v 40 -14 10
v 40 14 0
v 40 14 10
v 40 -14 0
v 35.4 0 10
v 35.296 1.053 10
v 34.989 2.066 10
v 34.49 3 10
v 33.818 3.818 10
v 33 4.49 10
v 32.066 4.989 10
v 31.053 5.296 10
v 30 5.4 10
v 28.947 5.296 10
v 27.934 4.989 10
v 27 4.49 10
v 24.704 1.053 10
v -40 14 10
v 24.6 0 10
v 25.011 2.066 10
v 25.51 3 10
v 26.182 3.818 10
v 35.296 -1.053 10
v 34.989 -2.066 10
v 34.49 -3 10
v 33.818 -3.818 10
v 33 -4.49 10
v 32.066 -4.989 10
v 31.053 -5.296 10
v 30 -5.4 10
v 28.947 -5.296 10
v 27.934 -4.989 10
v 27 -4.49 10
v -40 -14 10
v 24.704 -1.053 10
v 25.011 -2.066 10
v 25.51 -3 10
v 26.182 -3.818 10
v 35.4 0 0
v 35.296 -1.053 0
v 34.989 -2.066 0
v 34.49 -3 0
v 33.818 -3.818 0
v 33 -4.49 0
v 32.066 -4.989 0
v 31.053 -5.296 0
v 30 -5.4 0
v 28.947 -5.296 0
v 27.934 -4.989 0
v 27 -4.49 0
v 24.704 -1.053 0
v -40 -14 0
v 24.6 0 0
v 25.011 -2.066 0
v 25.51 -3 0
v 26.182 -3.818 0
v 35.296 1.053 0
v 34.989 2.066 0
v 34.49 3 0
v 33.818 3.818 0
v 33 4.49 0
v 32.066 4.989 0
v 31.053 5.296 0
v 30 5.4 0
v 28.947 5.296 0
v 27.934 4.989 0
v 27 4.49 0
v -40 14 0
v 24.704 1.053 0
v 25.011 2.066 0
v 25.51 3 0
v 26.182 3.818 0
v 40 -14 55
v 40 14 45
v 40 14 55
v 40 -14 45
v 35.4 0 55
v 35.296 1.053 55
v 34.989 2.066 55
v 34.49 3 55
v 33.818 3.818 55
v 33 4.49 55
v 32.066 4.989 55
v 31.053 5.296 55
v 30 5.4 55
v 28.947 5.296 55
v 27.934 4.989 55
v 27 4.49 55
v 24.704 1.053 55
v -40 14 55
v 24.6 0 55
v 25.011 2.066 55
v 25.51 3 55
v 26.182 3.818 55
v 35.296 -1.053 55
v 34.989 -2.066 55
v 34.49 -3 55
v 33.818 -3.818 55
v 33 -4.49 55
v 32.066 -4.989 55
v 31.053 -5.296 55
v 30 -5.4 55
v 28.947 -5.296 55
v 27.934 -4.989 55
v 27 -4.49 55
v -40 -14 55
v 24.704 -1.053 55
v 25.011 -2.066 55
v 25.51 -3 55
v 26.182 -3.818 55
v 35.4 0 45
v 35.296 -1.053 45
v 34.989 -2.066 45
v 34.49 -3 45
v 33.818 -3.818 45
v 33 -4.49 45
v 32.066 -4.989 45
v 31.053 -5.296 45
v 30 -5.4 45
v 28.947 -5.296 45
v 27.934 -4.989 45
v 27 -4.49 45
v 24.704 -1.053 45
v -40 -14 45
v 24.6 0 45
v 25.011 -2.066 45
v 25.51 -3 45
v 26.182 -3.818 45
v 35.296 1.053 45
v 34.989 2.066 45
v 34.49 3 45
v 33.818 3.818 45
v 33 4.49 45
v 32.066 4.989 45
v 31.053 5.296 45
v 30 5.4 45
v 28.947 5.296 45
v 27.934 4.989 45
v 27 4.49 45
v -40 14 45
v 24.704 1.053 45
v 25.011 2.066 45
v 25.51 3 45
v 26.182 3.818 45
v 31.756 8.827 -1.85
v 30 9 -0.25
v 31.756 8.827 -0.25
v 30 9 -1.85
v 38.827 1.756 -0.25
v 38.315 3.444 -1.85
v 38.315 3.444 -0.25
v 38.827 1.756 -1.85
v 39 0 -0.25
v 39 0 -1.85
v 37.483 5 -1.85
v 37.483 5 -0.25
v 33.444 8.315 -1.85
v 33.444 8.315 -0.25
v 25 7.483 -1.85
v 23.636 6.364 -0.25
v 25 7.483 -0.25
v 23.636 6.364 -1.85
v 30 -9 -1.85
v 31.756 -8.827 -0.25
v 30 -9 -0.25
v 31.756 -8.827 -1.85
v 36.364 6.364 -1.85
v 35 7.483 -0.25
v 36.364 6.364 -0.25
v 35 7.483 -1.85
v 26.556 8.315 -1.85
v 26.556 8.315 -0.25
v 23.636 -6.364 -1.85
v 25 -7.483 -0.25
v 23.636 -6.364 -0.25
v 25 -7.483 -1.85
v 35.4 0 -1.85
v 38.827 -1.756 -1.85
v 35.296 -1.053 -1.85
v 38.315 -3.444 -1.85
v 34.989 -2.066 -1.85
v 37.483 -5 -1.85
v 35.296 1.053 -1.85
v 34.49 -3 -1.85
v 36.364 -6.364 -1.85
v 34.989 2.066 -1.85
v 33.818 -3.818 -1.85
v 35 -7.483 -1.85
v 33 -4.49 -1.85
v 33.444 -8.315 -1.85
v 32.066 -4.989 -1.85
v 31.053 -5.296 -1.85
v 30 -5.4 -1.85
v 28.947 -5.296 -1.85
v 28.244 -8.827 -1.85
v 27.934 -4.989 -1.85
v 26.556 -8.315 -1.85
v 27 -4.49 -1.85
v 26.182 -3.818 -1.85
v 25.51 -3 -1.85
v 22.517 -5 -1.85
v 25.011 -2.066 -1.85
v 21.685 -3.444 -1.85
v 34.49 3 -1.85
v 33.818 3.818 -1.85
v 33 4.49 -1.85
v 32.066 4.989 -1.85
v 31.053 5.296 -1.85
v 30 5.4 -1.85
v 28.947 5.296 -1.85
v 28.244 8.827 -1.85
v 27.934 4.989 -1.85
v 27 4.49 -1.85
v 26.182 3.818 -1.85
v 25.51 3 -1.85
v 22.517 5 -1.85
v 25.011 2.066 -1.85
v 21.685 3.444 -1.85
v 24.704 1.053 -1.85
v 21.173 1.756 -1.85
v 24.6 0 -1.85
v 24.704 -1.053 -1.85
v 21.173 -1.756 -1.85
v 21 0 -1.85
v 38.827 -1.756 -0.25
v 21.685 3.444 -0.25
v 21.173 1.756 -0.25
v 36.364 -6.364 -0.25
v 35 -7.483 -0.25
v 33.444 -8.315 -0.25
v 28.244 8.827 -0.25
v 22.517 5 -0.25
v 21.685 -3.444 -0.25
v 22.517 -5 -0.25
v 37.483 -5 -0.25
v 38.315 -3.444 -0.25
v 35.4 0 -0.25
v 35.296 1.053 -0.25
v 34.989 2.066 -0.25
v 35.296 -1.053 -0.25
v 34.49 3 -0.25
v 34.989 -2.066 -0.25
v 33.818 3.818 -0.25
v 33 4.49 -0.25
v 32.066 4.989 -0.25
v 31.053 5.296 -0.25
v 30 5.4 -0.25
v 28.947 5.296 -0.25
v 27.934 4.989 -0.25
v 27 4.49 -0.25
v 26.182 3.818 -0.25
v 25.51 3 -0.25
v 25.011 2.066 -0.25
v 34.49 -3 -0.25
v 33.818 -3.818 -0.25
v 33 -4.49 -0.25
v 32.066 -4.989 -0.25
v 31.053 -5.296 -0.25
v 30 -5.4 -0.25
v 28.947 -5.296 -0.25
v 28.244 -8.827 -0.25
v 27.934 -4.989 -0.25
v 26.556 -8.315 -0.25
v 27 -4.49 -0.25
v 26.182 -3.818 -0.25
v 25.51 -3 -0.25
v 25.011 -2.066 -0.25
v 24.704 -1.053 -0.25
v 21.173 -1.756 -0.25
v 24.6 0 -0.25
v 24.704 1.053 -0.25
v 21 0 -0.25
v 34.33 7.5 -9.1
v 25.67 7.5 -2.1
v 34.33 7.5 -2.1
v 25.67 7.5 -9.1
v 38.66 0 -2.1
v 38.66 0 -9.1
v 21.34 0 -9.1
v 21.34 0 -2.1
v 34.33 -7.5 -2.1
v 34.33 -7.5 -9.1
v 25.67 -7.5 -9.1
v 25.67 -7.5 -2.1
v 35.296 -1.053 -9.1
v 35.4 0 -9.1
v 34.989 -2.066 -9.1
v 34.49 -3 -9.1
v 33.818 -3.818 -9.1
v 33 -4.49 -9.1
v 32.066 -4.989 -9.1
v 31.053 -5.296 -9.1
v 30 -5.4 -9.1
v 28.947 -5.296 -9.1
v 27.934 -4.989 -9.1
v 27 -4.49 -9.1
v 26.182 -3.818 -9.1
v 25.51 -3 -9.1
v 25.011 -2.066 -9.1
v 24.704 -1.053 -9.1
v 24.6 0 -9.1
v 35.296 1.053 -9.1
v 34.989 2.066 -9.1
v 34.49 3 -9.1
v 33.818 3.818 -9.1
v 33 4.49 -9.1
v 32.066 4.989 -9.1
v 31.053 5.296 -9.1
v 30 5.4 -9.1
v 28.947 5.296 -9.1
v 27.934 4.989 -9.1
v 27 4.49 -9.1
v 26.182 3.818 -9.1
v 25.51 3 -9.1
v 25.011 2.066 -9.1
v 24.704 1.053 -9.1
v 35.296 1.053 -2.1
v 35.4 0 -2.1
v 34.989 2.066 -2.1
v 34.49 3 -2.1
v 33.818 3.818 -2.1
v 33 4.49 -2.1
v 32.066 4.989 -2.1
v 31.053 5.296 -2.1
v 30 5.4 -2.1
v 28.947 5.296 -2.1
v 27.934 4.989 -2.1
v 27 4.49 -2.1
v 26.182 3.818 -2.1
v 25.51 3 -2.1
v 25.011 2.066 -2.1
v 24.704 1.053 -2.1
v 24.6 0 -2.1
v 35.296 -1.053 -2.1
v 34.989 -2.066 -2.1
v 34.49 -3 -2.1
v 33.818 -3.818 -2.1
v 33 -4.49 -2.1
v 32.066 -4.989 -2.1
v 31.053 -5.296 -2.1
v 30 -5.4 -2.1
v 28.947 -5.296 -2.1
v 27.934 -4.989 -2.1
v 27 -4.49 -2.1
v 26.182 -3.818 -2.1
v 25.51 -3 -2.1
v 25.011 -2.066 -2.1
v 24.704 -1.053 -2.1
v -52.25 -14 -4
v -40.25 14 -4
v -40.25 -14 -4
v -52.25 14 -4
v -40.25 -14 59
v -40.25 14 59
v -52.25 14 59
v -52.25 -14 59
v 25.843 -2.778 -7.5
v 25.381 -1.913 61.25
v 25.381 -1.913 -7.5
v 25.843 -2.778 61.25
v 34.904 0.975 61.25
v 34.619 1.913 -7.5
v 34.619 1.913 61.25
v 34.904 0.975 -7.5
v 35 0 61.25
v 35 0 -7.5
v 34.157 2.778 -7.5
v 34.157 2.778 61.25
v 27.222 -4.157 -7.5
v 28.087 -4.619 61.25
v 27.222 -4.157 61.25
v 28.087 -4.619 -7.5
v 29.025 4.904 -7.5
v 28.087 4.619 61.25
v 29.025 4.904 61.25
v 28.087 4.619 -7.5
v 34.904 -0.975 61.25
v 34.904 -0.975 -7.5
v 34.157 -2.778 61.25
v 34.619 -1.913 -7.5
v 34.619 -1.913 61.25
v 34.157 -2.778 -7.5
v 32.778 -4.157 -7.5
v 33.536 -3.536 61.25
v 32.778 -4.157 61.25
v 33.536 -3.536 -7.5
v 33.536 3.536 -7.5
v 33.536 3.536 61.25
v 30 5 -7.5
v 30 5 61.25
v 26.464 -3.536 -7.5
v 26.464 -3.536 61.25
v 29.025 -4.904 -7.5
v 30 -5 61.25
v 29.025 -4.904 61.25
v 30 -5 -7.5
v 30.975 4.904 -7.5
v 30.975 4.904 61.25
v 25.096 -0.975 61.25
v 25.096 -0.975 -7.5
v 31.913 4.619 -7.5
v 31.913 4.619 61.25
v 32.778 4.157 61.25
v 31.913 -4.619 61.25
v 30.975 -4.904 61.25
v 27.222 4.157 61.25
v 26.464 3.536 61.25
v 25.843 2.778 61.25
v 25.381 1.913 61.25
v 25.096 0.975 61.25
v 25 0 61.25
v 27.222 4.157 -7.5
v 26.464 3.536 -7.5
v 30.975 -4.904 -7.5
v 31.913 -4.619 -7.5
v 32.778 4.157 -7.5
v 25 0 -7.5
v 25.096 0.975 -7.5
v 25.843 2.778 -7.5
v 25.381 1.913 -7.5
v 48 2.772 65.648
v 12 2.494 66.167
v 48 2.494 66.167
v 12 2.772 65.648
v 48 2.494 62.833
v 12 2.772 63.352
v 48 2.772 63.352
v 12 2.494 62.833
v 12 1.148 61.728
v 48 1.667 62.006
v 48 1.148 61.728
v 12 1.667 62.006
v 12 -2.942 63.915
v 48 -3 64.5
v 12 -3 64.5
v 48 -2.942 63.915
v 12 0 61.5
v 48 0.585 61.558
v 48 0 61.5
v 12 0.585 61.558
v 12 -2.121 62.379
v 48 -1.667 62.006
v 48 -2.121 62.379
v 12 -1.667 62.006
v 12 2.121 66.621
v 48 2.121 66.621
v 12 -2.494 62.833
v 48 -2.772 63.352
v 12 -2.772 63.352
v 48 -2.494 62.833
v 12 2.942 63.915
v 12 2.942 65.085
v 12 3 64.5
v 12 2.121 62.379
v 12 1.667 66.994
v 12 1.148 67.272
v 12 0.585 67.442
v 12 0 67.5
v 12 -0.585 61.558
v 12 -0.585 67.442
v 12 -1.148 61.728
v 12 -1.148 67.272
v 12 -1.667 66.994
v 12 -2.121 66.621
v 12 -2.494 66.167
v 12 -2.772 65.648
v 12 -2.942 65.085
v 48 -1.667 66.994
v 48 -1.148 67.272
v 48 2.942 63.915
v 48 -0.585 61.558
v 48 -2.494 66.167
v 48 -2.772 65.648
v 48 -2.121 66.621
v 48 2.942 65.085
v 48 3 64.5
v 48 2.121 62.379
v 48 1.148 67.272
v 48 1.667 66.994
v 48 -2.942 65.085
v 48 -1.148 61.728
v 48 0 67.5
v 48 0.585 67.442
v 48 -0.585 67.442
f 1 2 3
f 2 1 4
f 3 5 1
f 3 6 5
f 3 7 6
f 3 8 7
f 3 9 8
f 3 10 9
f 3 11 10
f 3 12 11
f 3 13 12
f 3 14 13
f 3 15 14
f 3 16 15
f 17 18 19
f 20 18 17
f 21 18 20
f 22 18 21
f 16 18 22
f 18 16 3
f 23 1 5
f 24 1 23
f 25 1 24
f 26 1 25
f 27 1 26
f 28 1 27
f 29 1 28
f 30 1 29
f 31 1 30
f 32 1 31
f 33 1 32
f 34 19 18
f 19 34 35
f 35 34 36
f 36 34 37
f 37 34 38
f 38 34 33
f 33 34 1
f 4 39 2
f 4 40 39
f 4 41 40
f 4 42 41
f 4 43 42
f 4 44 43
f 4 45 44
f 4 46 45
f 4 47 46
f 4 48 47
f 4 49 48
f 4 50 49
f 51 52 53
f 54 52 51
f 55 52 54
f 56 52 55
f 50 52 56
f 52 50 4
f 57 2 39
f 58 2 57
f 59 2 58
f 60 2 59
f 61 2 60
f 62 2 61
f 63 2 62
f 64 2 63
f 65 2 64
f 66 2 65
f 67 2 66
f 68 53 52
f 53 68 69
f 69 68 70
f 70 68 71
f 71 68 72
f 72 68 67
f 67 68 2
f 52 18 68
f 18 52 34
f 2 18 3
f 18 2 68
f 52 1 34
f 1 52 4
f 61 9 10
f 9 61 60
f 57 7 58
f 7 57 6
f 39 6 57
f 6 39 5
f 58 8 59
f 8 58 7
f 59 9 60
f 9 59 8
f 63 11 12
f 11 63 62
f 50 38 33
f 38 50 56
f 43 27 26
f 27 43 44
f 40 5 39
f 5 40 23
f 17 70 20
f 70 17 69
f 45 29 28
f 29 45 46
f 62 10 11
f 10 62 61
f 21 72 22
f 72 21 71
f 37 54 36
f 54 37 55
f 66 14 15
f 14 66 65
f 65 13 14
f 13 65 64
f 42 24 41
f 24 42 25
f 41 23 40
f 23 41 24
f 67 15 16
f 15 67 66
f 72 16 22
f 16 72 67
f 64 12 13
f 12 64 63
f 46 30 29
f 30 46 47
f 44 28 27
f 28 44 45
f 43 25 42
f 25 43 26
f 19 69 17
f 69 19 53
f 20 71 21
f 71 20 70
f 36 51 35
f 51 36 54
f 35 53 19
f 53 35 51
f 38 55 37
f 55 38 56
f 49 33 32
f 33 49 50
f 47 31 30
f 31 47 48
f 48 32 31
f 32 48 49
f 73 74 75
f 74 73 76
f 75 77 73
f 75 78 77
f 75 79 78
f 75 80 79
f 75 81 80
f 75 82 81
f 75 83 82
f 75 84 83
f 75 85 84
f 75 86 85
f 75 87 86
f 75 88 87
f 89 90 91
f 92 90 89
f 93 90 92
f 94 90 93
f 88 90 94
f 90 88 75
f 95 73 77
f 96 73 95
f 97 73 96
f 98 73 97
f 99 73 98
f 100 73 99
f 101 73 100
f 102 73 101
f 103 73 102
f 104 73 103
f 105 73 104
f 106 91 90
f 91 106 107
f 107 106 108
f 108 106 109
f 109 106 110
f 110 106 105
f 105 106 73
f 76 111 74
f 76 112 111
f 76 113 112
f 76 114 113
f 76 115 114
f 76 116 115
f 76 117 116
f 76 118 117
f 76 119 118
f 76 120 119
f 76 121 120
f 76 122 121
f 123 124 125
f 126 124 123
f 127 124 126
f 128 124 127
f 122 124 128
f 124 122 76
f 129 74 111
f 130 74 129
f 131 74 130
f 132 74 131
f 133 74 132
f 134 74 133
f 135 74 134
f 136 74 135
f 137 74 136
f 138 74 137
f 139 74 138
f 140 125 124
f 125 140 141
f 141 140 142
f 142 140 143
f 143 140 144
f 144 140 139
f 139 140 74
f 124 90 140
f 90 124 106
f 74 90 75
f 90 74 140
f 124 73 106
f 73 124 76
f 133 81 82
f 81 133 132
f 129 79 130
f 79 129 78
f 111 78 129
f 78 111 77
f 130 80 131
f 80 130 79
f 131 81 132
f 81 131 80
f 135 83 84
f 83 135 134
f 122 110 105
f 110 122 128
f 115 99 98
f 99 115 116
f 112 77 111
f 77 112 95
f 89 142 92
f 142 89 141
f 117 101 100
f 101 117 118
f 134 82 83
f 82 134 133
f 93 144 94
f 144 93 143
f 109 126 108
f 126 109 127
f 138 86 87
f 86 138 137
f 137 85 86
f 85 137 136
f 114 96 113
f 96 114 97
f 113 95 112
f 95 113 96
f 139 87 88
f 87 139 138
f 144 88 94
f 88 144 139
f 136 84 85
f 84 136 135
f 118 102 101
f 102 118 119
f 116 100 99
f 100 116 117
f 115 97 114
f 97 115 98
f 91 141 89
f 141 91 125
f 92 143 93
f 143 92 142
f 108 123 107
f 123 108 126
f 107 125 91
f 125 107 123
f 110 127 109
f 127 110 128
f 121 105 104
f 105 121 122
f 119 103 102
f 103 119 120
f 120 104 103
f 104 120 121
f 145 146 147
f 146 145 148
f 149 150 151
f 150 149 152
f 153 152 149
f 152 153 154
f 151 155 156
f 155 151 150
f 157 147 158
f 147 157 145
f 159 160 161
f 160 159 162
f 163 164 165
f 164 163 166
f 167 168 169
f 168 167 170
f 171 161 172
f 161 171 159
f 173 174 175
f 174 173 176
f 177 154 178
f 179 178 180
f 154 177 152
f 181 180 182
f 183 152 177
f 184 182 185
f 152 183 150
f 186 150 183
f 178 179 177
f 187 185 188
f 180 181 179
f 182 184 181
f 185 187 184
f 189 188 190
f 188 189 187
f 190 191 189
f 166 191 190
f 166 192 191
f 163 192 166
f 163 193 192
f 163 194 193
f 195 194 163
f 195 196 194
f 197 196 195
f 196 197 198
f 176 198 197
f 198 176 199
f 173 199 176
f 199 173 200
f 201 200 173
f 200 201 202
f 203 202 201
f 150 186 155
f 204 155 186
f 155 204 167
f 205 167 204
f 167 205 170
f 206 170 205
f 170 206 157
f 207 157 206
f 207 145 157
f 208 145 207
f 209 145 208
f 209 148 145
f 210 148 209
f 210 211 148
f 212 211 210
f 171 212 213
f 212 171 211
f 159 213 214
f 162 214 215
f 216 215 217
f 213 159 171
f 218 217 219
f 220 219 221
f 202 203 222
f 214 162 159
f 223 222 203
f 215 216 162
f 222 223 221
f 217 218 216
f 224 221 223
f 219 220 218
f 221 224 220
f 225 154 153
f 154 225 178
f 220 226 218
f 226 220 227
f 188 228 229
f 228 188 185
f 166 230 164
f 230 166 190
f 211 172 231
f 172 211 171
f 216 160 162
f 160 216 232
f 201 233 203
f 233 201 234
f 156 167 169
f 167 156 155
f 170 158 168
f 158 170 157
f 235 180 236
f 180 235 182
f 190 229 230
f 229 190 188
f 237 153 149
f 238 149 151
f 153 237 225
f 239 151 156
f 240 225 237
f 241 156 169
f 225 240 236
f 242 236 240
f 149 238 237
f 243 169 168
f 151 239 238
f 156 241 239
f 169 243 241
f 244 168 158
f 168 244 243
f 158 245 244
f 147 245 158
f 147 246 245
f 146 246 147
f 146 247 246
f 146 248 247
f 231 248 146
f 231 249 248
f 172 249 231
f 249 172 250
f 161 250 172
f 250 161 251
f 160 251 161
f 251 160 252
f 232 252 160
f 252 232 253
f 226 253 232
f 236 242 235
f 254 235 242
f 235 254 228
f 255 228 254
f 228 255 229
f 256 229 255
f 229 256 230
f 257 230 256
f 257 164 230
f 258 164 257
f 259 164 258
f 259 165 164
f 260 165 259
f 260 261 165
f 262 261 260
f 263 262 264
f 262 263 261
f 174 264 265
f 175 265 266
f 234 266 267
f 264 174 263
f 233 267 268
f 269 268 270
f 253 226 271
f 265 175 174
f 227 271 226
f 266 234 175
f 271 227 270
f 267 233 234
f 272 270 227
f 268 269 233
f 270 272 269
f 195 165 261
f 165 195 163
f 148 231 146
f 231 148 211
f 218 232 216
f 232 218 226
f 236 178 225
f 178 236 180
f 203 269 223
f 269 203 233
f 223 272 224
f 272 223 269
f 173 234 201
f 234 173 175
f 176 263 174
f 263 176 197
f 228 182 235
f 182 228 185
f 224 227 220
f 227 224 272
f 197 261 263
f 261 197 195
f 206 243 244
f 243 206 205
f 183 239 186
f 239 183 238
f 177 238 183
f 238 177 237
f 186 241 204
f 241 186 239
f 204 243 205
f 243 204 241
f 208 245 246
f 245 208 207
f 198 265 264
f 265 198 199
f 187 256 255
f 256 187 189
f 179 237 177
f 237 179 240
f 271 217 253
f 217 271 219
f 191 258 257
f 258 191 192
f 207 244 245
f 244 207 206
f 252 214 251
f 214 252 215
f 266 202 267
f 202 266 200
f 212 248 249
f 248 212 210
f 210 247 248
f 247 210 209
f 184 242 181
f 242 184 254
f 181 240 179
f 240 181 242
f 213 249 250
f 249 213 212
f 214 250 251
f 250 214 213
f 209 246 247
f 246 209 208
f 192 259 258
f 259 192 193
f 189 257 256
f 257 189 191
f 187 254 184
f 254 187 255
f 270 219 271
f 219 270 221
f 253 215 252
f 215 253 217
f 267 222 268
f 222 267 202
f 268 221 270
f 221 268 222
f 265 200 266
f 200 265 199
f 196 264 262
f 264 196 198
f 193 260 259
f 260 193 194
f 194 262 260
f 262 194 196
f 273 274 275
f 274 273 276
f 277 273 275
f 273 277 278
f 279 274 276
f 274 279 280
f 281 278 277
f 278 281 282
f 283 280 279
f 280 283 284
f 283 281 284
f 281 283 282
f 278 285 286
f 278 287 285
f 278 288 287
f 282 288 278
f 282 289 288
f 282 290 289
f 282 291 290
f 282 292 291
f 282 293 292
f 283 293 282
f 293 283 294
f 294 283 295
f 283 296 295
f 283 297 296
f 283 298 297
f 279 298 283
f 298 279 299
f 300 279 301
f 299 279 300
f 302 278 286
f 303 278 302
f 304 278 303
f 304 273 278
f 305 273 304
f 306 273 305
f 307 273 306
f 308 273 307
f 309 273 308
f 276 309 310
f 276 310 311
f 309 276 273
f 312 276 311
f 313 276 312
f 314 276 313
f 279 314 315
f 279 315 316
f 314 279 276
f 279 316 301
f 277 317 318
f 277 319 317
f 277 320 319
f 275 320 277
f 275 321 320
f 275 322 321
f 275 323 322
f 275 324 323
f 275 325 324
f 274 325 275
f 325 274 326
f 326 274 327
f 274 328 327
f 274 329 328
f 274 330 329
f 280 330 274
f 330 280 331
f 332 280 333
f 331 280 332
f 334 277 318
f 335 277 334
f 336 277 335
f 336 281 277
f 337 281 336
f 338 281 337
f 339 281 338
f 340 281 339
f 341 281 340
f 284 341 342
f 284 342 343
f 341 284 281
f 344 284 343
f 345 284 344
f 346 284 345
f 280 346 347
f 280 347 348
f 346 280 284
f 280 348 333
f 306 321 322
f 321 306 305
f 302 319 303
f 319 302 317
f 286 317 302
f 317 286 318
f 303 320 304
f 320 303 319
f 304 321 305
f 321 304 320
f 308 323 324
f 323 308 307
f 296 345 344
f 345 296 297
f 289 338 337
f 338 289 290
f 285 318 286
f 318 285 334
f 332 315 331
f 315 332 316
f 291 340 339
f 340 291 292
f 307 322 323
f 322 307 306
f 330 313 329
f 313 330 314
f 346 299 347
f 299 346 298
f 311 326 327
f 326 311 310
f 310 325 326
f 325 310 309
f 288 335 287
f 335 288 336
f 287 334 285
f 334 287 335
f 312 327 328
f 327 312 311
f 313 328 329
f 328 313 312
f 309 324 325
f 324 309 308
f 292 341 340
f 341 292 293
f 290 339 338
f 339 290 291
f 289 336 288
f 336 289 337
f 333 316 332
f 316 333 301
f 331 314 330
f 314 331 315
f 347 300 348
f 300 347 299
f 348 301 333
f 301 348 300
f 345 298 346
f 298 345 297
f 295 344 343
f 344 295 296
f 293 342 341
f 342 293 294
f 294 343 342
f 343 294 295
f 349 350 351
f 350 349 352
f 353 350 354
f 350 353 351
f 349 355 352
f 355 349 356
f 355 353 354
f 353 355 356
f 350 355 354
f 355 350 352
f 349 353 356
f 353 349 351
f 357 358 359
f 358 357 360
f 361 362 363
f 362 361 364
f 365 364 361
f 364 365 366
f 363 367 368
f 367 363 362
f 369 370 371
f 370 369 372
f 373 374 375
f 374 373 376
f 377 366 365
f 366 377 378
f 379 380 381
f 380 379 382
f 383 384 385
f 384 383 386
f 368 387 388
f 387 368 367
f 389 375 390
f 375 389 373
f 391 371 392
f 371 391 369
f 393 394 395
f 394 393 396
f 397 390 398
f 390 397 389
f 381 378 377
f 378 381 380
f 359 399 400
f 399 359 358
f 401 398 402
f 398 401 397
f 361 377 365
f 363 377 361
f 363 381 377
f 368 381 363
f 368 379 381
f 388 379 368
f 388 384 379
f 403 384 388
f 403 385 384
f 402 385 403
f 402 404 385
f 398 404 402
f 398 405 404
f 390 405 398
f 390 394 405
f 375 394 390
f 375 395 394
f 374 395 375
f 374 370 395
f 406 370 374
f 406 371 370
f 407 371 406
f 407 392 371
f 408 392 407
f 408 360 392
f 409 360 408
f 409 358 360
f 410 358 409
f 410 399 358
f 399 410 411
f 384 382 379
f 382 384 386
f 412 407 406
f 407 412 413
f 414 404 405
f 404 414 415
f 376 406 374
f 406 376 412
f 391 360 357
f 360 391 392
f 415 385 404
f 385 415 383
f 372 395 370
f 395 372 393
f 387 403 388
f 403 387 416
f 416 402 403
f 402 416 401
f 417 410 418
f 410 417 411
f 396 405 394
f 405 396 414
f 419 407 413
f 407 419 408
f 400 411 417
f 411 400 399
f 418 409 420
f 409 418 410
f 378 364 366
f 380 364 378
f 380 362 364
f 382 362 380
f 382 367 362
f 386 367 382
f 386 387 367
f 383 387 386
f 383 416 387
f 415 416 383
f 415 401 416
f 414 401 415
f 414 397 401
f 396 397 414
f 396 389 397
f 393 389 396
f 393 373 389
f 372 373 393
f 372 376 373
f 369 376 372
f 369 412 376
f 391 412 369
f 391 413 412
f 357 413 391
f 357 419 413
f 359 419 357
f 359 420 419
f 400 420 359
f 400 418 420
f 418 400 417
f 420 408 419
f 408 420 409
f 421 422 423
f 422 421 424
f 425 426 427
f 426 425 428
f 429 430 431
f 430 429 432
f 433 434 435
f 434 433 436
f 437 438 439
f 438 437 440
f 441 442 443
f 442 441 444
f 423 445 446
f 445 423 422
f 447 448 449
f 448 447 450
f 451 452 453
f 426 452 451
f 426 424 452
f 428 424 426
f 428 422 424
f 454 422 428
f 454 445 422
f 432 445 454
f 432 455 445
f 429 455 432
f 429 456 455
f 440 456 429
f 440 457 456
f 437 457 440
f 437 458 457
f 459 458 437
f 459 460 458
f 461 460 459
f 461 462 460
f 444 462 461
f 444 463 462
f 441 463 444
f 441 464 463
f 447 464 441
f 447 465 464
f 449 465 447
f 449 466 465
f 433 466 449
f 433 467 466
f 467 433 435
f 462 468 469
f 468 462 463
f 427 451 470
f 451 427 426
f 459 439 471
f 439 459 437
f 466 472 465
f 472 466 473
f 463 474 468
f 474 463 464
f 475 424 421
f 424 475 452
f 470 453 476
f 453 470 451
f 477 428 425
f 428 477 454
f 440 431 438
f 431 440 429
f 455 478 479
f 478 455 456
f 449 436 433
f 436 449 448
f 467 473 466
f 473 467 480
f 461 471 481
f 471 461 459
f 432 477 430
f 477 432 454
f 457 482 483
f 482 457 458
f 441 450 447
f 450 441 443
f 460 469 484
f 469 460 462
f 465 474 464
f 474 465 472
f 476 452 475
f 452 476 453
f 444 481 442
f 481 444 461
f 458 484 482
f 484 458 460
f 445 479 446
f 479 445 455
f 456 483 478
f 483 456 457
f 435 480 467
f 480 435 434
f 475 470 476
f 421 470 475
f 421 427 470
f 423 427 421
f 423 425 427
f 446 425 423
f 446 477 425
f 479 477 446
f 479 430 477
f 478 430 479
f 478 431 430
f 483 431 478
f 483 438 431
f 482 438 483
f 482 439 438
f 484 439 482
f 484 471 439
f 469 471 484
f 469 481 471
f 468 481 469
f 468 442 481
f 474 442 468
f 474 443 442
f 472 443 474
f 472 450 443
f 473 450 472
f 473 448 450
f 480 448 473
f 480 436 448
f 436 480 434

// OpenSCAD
$fn = 32;

// ------------------------------------------------------------------------
// C clamp: throat 45 mm, screw d10
// Every part is its own module, assembly() places every instance.
// ------------------------------------------------------------------------

// --- part 1 ---
module clamp_arm() {
  difference() {
    translate([-40, -14, 0]) cube([80, 28, 10]);
    translate([30, 0, -1]) cylinder(h = 12, d = 10.8);
  }
}

// --- part 2 ---
module clamp_spine() {
  difference() {
    translate([-31.5, -14, 0]) cube([63, 28, 12]);
  }
}

// --- part 3 ---
module clamp_screw() {
  translate([0, 0, -34.375]) cylinder(h = 68.75, d = 10);
}

// --- part 4 ---
module clamp_washer() {
  difference() {
      translate([0, 0, 0]) cylinder(h = 1.6, d = 18);
      translate([0, 0, -1]) cylinder(h = 3.6, d = 10.8);
    }
}

// --- part 5 ---
module clamp_nut() {
  difference() {
    linear_extrude(height = 7) polygon(points = [[8.66, 0], [4.33, 7.5], [-4.33, 7.5], [-8.66, 0], [-4.33, -7.5], [4.33, -7.5]]);
    translate([0, 0, -1]) cylinder(h = 9, d = 10.8);
  }
}

// --- part 6 ---
module tommy_bar() {
  translate([0, 0, -18]) cylinder(h = 36, d = 6);
}

// --- assembly ---
module assembly() {
  color([0.80, 0.24, 0.20]) translate([0, 0, 0]) rotate([0, 0, 0]) clamp_arm();
  color([0.20, 0.45, 0.75]) translate([0, 0, 45]) rotate([0, 0, 0]) clamp_arm();
  color([0.25, 0.62, 0.32]) translate([-52.25, 0, 27.5]) rotate([0, 90, 0]) clamp_spine();
  color([0.92, 0.70, 0.18]) translate([30, 0, 26.875]) rotate([0, 0, 0]) clamp_screw();
  color([0.58, 0.35, 0.70]) translate([30, 0, -1.85]) rotate([0, 0, 0]) clamp_washer();
  color([0.16, 0.66, 0.66]) translate([30, 0, -9.1]) rotate([0, 0, 0]) clamp_nut();
  color([0.85, 0.48, 0.18]) translate([30, 0, 64.5]) rotate([0, 90, 0]) tommy_bar();
}

assembly();
